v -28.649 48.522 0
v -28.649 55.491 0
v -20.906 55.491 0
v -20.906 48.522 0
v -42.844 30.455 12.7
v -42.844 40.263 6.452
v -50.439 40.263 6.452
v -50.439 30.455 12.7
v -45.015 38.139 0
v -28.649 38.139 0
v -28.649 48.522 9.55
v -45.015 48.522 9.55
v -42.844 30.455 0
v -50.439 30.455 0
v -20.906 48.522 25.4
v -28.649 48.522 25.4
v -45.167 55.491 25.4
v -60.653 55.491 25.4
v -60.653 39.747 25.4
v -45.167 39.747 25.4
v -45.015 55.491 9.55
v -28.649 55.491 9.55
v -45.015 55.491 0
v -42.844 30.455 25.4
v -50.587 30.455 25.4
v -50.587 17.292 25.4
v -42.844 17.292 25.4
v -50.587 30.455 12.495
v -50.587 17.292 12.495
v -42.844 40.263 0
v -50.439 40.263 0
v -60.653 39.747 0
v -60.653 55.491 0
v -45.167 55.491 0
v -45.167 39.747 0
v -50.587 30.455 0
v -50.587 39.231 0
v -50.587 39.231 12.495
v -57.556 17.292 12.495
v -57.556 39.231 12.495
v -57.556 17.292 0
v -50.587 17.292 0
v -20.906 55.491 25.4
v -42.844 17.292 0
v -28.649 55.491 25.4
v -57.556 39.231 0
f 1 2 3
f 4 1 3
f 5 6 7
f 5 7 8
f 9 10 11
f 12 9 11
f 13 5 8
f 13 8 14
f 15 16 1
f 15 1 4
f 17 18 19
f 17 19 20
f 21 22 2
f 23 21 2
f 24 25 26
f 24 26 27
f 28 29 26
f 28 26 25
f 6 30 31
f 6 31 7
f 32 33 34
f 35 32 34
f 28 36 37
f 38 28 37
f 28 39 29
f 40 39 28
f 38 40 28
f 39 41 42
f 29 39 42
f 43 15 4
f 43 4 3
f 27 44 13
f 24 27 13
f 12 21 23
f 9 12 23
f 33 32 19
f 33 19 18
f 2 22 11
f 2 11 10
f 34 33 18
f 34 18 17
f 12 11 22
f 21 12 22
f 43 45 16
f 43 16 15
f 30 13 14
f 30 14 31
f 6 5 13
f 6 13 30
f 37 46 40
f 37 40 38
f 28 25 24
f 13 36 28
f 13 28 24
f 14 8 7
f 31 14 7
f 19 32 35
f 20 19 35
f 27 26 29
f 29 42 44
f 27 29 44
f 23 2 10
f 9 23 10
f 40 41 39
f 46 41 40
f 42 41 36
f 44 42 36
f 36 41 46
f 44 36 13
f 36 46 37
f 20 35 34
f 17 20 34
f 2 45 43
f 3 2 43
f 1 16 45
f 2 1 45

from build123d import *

# Parameters (mm, degrees)
F0_W      = 15.485808
F0_H      = 15.743904
F2_DEPTH  = 25.4
F1_W      = 7.742904
F1_H      = 13.162935
F3_DEPTH  = 25.4
F4_W      = 7.742903
F4_H      = 6.96861
F5_DEPTH  = 25.4
F6_W      = 6.968613
F6_H      = 21.938227
F7_DEPTH  = 12.49516
F9_DEPTH  = 7.59542
F11_DEPTH = 16.36661


with BuildPart() as f2:
    # F0 (on Top) → F2 (new body)
    with BuildSketch(Plane.XY):
        with Locations((-52.90984, 47.618855)):
            Rectangle(F0_W, F0_H)
    extrude(amount=F2_DEPTH)


with BuildPart() as f3:
    # F1 (on Top) → F3 (new body)
    with BuildSketch(Plane.XY):
        with Locations((-46.715517, 23.873953)):
            Rectangle(F1_W, F1_H)
    extrude(amount=F3_DEPTH)

    # F6 (on Top) → F7 (join)
    with BuildSketch(Plane.XY):
        with Locations((-54.071275, 28.261598)):
            Rectangle(F6_W, F6_H)
    extrude(amount=F7_DEPTH)


with BuildPart() as f5:
    # F4 (on Top) → F5 (new body)
    with BuildSketch(Plane.XY):
        with Locations((-24.77729, 52.006502)):
            Rectangle(F4_W, F4_H)
    extrude(amount=F5_DEPTH)


with BuildPart() as f9:
    # F8 (on face) → F9 (new body)
    with BuildSketch(Plane.YZ.offset(-42.844065)):
        Polygon((40.263098, 6.452419), (30.45542, 12.7), (30.45542, 0), (40.263098, 0), align=None)
    extrude(amount=-F9_DEPTH)


with BuildPart() as f11:
    # F10 (on face) → F11 (new body)
    with BuildSketch(Plane(origin=(-28.648742, 0, 0), x_dir=(0, -1, 0), z_dir=(-1, 0, 0))):
        Polygon((-48.522197, 9.549581), (-55.490807, 9.549581), (-55.490807, 2.580968), (-55.490807, 0), (-38.138844, 0), align=None)
    extrude(amount=F11_DEPTH)


solid = Compound([f2.part, f3.part, f5.part, f9.part, f11.part])
